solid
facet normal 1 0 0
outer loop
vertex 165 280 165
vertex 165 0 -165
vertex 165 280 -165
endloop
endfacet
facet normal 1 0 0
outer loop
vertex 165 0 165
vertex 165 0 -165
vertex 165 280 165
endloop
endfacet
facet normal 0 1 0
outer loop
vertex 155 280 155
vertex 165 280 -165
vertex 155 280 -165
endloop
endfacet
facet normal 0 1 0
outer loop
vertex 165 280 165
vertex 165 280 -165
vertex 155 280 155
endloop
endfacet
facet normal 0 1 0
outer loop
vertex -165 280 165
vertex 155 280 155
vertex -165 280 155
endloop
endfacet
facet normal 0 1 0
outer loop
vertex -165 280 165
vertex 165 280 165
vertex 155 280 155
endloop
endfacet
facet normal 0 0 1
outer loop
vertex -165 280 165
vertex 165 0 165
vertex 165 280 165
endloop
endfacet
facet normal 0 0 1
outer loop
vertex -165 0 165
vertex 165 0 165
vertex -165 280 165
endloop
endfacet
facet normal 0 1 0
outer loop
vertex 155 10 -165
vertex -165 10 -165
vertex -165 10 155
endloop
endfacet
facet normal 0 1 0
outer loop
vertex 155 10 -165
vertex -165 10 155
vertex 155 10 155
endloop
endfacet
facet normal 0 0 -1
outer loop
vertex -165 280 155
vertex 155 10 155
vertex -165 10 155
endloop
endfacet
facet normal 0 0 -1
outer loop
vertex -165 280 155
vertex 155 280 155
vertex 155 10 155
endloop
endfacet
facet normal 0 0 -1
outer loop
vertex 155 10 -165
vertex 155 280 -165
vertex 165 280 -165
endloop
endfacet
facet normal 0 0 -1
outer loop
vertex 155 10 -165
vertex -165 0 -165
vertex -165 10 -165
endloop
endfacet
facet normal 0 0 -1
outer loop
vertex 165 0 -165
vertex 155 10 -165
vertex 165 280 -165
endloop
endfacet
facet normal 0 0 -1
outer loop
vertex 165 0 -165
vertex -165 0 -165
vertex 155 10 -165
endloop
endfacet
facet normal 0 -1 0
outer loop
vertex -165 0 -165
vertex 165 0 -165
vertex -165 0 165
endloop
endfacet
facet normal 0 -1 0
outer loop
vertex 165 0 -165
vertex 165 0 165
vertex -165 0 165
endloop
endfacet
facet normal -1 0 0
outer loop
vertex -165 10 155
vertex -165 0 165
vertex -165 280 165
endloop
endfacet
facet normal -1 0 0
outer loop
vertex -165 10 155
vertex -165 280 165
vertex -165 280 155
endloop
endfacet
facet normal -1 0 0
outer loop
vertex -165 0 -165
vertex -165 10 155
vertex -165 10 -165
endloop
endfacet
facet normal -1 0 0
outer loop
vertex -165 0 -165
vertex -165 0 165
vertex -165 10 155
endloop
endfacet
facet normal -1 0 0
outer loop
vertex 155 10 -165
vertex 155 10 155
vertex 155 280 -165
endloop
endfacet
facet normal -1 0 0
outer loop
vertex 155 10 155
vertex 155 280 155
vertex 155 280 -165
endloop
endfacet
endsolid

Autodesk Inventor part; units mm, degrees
ref_plane "YZ Plane" through (0, 0, 0) normal (1, 0, 0) x (0, 1, 0)
ref_plane "XY Plane" through (0, 0, 0) normal (0, 0, 1) x (1, 0, 0)
sketch "Sketch1" plane through (0, 0, 0) normal (0, 1, 0) x (-1, 0, 0)
  line L0 (155, 155) -> (-155, 155)
  line L1 (-155, 155) -> (-155, -155)
  line L2 (-155, -155) -> (155, -155)
  line L3 (155, -155) -> (155, 155)
  line L4 (155, 155) -> (-155, -155) construction
  line L5 (-155, 155) -> (155, -155) construction
  line L6 (165, -165) -> (-165, -165)
  line L7 (-165, -165) -> (-165, 165)
  line L8 (-165, 165) -> (165, 165)
  line L9 (165, 165) -> (165, -165)
  point P0 (0, 0)
  dimension "d0" = 310
  dimension "d1" = 310
extrude "Extrusion1" add sketch "Sketch1" along normal blind 10 contours L3 L2 L1 L0 | L6 L7 L8 L9
extrude "Extrusion2" add sketch "Sketch1" along normal blind 280
sketch "Sketch4" plane through (0, 280, 0) normal (0, 1, 0) x (1, 0, 0)
  line L0 (-155, 155) -> (-155, -155) projected
  line L1 (-155, -155) -> (155, -155) projected
  line L2 (155, -155) -> (155, 155) projected
  line L3 (155, 155) -> (-155, 155) projected
  point P0 (0, 0)
  dimension "d6" = 310
  dimension "d7" = 310
sketch "Sketch5" plane through (155, 10, 155) normal (-1, 0, 0) x (0, 0, 1)
  line L0 (0, 0) -> (-310, 0) projected
  line L1 (0, 0) -> (0, 270) projected
  line L2 (-310, 270) -> (0, 270) projected
  line L3 (-310, 0) -> (-310, 270) projected
  point P0 (-155, -10)
  dimension "d8" = 270
sketch "Sketch6" plane through (0, 10, 0) normal (0, 1, 0) x (1, 0, 0)
  line L0 (-155, 155) -> (-155, -155) projected
  line L1 (-155, -155) -> (155, -155) projected
  line L2 (155, -155) -> (155, 155) projected
  line L3 (155, 155) -> (-155, 155) projected
  point P0 (0, 0)
sketch "Sketch7" plane through (-155, 10, -155) normal (1, 0, 0) x (0, 0, -1)
  line L0 (0, 0) -> (-310, 0) projected
  line L1 (0, 0) -> (0, 270) projected
  line L2 (-310, 270) -> (0, 270) projected
  line L3 (-310, 0) -> (-310, 270) projected
  point P0 (-155, -10)
sketch "Sketch8" plane through (0, 280, 0) normal (0, 1, 0) x (1, 0, 0)
  line L0 (165, 165) -> (-165, 165)
  line L1 (155, 155) -> (155, 165)
  line L2 (-165, 165) -> (165, 165)
  line L3 (-155, 155) -> (-155, 165)
  line L4 (155, 155) -> (-155, 155)
  point P0 (0, 0)
  dimension "d0" = 310
extrude "Extrusion3" cut sketch "Sketch8" against normal blind 270
sketch "Sketch9" plane through (0, 280, 0) normal (0, 1, 0) x (1, 0, 0)
  line L0 (-155, -155) -> (-155, 165) projected
  line L1 (-155, 165) -> (-165, 165) projected
  line L2 (-165, 165) -> (-165, -165) projected
  line L3 (-165, -165) -> (165, -165) projected
  line L4 (165, -165) -> (165, 165) projected
  line L5 (165, 165) -> (155, 165) projected
  line L6 (155, 165) -> (155, -155) projected
  line L7 (155, -155) -> (-155, -155) projected
  line L8 (-155, -155) -> (-165, -155)
  point P0 (0, 0)
extrude "Extrusion4" cut sketch "Sketch9" against normal blind 270 contours L8 L2 L1 L0
ref_plane "Work Plane1" through (0, 10, 0) normal (0, 1, 0) x (-1, 0, 0)
properties part number "Box Pengukuran"
